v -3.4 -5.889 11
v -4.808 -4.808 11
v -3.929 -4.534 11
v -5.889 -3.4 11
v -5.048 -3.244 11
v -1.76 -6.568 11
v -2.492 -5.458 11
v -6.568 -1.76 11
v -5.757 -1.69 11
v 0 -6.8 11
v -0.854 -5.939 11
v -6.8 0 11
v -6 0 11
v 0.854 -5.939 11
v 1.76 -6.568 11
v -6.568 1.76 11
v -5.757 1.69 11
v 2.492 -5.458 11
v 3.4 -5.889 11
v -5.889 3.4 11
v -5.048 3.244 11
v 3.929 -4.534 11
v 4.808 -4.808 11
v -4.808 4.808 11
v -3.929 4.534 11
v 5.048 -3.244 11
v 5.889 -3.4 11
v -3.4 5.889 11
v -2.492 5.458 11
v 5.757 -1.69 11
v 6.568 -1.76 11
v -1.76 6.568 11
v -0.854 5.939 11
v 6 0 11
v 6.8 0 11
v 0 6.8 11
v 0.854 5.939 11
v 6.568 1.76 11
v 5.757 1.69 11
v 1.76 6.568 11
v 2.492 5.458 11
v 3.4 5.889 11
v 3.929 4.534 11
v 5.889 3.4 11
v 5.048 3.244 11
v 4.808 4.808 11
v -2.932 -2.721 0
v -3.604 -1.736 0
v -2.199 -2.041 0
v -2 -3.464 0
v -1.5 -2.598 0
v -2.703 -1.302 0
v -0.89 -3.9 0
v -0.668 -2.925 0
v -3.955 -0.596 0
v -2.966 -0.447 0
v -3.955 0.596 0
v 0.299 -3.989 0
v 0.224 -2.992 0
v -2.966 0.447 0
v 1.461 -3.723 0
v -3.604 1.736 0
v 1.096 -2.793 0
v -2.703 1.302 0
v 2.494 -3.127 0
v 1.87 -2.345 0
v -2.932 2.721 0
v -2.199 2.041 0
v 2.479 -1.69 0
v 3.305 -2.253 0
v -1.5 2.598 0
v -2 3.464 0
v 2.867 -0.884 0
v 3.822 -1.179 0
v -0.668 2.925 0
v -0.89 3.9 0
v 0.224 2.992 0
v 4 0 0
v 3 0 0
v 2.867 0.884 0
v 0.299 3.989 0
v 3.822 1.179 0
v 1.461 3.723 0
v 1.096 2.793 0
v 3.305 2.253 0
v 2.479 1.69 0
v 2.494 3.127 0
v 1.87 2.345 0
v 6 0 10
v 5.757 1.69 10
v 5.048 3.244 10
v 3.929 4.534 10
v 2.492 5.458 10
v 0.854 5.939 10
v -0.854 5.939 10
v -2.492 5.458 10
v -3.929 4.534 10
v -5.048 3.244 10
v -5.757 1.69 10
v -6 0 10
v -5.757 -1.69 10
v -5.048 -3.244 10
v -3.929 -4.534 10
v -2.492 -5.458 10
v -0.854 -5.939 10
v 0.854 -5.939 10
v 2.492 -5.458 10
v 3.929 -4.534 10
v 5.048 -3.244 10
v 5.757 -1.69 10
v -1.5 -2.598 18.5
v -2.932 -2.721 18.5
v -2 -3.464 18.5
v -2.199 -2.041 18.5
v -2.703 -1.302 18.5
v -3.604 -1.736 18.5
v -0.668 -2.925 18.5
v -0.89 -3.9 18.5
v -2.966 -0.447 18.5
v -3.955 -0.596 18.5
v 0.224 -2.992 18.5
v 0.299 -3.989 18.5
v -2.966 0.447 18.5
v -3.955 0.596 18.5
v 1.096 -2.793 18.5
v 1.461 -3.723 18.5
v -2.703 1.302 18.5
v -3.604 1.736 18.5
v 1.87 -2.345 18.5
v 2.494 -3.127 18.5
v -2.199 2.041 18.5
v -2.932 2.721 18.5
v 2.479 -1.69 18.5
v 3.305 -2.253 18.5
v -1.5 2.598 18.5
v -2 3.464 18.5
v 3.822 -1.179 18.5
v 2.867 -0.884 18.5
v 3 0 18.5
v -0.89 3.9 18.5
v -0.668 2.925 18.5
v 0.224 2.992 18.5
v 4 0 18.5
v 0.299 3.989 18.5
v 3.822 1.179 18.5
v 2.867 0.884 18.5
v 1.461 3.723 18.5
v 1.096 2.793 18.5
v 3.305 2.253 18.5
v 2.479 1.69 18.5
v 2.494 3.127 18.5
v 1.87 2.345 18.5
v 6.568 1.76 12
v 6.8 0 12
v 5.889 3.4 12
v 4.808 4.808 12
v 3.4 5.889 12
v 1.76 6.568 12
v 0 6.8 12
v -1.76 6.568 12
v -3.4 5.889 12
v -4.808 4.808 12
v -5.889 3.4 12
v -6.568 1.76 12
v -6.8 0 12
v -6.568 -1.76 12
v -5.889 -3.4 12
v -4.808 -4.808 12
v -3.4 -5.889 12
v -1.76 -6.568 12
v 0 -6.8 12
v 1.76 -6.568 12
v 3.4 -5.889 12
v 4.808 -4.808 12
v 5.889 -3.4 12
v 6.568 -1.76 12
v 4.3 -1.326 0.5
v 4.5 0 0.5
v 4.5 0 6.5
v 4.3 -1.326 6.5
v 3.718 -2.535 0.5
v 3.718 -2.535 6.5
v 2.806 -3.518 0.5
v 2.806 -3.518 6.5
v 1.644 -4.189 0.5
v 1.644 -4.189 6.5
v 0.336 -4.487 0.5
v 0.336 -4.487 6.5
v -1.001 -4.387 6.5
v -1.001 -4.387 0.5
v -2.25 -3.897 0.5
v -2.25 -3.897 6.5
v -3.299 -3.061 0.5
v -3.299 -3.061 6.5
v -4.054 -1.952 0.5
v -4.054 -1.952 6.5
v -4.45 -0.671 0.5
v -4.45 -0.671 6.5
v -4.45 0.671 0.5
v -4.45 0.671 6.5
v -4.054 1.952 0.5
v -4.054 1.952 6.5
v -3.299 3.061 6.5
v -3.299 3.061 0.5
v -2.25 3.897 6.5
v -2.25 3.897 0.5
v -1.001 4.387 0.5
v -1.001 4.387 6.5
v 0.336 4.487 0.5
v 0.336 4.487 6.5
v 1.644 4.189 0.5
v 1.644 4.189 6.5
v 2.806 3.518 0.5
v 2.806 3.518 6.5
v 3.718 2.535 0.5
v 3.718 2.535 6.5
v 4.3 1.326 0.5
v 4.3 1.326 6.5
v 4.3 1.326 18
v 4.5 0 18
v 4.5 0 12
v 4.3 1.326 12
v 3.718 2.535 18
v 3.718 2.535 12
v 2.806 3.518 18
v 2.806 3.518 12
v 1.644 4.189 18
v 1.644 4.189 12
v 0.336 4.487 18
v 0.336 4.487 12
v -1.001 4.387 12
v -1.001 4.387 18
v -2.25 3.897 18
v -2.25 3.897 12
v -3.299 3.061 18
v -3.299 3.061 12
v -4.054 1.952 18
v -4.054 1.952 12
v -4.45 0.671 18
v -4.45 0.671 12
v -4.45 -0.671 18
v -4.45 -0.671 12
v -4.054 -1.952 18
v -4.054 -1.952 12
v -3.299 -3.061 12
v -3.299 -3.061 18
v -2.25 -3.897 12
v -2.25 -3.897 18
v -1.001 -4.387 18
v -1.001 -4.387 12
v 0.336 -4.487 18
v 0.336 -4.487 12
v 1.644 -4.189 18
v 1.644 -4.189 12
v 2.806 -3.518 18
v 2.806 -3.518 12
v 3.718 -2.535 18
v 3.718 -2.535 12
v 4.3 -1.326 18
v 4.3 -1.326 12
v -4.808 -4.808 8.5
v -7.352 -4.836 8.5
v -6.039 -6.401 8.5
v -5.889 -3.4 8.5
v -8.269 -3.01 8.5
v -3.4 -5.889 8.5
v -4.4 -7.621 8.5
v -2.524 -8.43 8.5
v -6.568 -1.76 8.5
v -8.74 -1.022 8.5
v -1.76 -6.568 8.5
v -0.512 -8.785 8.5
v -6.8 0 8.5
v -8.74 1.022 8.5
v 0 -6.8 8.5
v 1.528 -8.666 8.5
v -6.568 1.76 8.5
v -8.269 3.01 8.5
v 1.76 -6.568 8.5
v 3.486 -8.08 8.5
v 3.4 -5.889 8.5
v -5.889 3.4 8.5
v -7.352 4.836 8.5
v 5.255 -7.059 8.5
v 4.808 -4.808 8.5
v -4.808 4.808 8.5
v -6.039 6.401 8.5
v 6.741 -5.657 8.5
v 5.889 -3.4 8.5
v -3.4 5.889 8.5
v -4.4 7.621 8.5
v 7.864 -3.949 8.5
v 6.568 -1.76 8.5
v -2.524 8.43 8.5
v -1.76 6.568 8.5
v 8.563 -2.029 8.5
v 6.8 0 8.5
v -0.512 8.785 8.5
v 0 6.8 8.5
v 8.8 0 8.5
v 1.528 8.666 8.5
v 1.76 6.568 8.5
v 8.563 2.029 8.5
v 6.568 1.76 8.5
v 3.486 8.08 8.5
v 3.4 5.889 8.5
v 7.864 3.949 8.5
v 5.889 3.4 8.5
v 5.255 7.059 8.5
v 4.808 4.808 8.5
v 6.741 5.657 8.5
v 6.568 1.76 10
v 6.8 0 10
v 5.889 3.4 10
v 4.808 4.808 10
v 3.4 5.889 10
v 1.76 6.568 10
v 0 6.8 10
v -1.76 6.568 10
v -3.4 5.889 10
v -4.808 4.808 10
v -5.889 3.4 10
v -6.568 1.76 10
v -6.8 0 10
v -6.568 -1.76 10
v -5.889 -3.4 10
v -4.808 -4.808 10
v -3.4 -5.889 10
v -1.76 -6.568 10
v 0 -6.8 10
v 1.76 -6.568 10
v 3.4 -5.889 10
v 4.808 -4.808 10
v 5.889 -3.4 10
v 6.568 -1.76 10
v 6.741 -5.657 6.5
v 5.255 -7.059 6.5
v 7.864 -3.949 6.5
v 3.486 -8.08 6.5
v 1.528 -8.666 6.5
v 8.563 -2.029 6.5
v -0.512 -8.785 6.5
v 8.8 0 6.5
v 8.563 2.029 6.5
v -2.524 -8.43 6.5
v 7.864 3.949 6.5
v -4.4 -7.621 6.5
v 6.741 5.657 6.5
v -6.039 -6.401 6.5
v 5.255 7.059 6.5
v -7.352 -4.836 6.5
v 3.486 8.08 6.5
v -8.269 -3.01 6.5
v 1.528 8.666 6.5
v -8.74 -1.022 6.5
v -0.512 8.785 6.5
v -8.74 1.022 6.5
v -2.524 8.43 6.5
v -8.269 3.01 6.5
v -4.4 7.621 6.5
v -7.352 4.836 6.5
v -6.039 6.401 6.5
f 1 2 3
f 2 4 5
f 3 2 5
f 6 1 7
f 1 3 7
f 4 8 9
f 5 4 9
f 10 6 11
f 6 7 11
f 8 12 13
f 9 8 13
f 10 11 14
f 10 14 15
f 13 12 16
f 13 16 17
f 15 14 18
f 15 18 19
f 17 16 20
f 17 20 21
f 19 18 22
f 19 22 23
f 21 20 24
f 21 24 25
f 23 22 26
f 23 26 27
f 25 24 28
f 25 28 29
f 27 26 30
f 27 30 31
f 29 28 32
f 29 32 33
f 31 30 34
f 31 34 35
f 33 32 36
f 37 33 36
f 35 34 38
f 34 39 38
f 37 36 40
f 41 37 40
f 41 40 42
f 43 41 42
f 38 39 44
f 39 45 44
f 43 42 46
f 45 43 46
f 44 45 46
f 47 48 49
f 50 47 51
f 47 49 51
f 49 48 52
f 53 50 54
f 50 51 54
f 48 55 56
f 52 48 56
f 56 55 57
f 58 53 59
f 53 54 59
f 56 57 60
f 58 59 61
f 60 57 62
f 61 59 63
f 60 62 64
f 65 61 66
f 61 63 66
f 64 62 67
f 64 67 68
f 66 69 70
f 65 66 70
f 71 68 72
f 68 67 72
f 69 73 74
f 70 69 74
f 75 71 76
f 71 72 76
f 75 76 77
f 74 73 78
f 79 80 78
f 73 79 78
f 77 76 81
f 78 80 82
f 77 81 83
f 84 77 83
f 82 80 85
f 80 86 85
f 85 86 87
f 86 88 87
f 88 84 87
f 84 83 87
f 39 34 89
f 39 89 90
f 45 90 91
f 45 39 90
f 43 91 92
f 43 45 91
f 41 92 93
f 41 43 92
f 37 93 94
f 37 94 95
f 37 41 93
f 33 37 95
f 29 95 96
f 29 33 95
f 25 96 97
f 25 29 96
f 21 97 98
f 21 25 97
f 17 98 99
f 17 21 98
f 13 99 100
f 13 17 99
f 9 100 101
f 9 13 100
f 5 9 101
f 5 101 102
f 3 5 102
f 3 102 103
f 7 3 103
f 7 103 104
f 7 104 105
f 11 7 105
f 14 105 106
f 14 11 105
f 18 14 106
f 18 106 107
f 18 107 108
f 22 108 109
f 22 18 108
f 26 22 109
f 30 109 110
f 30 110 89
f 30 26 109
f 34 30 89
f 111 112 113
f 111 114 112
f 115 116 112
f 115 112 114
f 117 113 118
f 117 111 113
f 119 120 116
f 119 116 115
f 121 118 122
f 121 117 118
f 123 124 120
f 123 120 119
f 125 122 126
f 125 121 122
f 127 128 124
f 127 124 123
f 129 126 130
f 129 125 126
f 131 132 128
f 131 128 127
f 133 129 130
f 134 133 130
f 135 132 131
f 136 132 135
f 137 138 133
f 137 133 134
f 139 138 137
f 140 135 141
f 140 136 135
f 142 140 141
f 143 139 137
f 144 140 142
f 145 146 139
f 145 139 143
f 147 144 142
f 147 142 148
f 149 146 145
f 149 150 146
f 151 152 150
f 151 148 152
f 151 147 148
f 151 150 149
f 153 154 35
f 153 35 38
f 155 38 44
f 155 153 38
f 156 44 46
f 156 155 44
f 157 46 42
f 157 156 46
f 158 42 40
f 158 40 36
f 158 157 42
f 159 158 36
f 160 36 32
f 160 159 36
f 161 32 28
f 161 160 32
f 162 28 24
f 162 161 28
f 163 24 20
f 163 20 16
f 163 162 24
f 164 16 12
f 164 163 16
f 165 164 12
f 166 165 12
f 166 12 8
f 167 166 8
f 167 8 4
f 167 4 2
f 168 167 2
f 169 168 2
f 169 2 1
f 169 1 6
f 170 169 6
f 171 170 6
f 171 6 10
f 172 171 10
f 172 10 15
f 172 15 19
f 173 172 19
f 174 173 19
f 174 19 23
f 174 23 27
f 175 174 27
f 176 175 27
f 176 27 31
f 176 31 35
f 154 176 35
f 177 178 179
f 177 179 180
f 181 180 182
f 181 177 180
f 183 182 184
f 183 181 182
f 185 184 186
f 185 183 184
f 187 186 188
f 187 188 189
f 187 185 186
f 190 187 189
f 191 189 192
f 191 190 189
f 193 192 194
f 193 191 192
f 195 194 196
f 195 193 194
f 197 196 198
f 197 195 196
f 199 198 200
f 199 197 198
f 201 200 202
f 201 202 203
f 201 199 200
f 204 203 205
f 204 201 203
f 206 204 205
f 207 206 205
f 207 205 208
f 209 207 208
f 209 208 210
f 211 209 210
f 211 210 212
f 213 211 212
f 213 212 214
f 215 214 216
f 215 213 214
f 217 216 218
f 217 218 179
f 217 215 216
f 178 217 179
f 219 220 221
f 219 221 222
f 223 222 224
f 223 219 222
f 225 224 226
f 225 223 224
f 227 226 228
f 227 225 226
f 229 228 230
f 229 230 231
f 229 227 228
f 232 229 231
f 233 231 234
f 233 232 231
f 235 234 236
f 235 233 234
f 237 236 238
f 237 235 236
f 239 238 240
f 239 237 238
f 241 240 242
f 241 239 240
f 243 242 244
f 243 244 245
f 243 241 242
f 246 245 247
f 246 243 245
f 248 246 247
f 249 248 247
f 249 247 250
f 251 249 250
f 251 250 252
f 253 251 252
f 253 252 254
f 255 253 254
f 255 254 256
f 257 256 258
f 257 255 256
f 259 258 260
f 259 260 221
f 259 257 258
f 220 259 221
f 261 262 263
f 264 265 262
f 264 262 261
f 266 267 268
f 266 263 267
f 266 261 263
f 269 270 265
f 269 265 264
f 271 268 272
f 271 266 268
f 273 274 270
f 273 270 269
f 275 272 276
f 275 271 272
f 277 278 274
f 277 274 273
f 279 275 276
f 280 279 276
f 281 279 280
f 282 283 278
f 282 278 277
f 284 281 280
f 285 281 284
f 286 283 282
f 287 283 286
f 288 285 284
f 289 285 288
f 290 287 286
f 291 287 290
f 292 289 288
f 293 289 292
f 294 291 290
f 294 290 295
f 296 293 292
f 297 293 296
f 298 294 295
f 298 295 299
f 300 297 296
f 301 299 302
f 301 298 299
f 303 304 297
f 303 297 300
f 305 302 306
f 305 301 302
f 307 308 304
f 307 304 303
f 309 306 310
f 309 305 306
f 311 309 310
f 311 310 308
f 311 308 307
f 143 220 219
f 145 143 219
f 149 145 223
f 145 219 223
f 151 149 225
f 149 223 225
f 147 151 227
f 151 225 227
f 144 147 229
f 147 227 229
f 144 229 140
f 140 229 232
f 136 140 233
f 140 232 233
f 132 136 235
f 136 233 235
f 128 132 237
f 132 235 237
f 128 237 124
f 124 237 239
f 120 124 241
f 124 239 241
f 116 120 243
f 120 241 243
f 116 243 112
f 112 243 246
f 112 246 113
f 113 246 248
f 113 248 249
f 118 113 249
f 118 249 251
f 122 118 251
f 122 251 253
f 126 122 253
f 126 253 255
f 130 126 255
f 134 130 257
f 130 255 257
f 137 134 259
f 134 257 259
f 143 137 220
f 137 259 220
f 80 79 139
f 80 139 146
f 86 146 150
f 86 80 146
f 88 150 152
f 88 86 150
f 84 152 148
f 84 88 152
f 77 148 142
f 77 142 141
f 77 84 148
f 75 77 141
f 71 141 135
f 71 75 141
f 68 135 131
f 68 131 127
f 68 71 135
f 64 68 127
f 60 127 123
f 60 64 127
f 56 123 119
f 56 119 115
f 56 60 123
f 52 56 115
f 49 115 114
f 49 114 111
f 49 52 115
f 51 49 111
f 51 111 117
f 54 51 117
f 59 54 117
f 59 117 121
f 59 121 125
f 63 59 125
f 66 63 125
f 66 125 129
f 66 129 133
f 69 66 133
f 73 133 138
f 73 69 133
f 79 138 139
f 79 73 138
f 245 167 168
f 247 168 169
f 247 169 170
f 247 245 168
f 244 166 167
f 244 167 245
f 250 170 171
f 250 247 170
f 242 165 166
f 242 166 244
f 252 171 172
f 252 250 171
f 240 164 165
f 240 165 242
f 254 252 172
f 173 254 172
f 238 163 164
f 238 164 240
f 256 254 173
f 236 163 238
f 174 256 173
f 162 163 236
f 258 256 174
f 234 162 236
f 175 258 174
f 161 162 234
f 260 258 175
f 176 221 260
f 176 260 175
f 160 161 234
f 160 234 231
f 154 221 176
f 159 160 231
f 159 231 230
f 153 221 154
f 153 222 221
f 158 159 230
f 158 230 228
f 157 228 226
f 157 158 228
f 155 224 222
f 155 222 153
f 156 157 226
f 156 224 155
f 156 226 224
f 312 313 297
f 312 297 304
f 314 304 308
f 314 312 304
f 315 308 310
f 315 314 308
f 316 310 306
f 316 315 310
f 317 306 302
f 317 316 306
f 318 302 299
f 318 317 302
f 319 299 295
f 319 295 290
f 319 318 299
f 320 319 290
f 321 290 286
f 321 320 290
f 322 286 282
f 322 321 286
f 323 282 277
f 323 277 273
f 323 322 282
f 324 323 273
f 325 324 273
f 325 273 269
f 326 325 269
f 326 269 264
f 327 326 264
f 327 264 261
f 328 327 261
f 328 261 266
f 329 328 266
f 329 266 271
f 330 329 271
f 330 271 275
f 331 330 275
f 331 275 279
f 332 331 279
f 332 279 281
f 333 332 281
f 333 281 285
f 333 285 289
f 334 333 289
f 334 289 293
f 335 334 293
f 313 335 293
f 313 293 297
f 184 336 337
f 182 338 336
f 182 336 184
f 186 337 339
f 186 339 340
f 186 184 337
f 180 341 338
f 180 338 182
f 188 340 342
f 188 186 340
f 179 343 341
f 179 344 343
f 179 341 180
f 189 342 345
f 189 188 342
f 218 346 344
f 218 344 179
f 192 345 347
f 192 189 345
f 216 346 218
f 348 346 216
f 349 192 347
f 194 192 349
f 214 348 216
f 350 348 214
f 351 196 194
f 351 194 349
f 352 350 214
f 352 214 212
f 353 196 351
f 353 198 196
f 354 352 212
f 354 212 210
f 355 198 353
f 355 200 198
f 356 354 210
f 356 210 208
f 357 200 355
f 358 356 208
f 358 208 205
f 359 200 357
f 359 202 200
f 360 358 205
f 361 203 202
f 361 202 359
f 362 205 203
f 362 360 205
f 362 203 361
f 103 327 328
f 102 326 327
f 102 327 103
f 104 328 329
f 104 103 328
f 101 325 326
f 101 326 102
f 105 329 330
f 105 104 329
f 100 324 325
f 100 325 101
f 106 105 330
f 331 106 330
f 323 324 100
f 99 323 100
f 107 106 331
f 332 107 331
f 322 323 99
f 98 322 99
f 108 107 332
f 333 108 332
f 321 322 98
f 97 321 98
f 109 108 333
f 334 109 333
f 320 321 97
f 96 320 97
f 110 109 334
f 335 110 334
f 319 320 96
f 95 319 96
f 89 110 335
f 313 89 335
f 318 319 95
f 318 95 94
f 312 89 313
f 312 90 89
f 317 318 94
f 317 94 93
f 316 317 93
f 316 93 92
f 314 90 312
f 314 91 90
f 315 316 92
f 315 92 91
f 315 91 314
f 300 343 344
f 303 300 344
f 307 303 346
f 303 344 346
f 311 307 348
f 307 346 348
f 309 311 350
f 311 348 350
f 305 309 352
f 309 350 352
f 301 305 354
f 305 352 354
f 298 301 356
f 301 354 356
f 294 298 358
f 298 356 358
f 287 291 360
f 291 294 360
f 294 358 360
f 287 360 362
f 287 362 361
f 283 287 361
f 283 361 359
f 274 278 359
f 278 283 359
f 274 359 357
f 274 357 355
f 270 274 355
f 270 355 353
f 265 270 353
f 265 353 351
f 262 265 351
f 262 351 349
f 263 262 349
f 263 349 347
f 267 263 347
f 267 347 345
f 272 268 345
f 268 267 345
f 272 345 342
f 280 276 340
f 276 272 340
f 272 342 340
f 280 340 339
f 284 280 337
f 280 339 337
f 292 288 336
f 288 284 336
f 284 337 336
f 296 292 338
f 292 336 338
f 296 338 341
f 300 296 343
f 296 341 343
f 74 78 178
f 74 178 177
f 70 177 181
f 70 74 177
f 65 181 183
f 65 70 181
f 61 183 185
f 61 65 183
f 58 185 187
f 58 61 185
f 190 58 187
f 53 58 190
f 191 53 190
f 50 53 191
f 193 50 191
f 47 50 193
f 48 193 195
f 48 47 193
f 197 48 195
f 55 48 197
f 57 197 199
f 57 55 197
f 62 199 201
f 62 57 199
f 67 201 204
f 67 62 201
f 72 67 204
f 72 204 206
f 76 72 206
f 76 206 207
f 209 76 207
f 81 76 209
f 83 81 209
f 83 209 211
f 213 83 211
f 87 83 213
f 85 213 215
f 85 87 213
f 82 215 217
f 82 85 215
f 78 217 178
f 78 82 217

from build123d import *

# Parameters (mm, degrees)
SKETCH1_R           = 8.8
SKETCH1_R_2         = 3
BOSS_EXTRUDE1_DEPTH = 18.5
SKETCH2_OUTSIDE_W   = 25.802
SKETCH2_OUTSIDE_H   = 25.802
SKETCH2_OUTSIDE_R   = 4.5
CUT_EXTRUDE1_DEPTH  = 6.5
SKETCH3_OUTSIDE_W   = 25.802
SKETCH3_OUTSIDE_H   = 25.802
SKETCH3_OUTSIDE_R   = 4.5
CUT_EXTRUDE2_DEPTH  = 6.5
SKETCH4_OUTSIDE_W   = 25.802
SKETCH4_OUTSIDE_H   = 25.802
SKETCH4_OUTSIDE_R   = 6.8
CUT_EXTRUDE3_DEPTH  = 3.5
CUT_EXTRUDE4_START  = -1
SKETCH5_OUTSIDE_W   = 25.802
SKETCH5_OUTSIDE_H   = 25.802
SKETCH5_OUTSIDE_R   = 6
CUT_EXTRUDE4_DEPTH  = 1
CHAMFER1_SIZE       = 0.5


with BuildPart() as part:
    # Sketch1 → Boss-Extrude1 (new body)
    with BuildSketch(Plane.XY):
        Circle(SKETCH1_R)
        Circle(SKETCH1_R_2, mode=Mode.SUBTRACT)
    extrude(amount=BOSS_EXTRUDE1_DEPTH)

    # Sketch2 outside → Cut-Extrude1 (cut)
    with BuildSketch(Plane.XY.offset(18.5)):
        Rectangle(SKETCH2_OUTSIDE_W, SKETCH2_OUTSIDE_H)
        Circle(SKETCH2_OUTSIDE_R, mode=Mode.SUBTRACT)
    extrude(amount=-CUT_EXTRUDE1_DEPTH, mode=Mode.SUBTRACT)

    # Sketch3 outside → Cut-Extrude2 (cut)
    with BuildSketch(Plane(origin=(0, 0, 0), x_dir=(-1, 0, 0), z_dir=(0, 0, -1))):
        Rectangle(SKETCH3_OUTSIDE_W, SKETCH3_OUTSIDE_H)
        with Locations(Location((0, 0, 0), (0, 0, 180))):
            Circle(SKETCH3_OUTSIDE_R, mode=Mode.SUBTRACT)
    extrude(amount=-CUT_EXTRUDE2_DEPTH, mode=Mode.SUBTRACT)

    # Sketch4 outside → Cut-Extrude3 (cut)
    with BuildSketch(Plane.XY.offset(12)):
        Rectangle(SKETCH4_OUTSIDE_W, SKETCH4_OUTSIDE_H)
        Circle(SKETCH4_OUTSIDE_R, mode=Mode.SUBTRACT)
    extrude(amount=-CUT_EXTRUDE3_DEPTH, mode=Mode.SUBTRACT)

    # Sketch5 outside → Cut-Extrude4 (cut)
    with BuildSketch(Plane.XY.offset(12).offset(CUT_EXTRUDE4_START)):
        Rectangle(SKETCH5_OUTSIDE_W, SKETCH5_OUTSIDE_H)
        Circle(SKETCH5_OUTSIDE_R, mode=Mode.SUBTRACT)
    extrude(amount=-CUT_EXTRUDE4_DEPTH, mode=Mode.SUBTRACT)

    # Chamfer1
    chamfer1_edges = [part.edges().sort_by_distance(p)[0] for p in [
        (-4.5, 0, 18.5),
        (-4.5, 0, 0),
    ]]
    chamfer(chamfer1_edges, length=CHAMFER1_SIZE)


solid = part.part
